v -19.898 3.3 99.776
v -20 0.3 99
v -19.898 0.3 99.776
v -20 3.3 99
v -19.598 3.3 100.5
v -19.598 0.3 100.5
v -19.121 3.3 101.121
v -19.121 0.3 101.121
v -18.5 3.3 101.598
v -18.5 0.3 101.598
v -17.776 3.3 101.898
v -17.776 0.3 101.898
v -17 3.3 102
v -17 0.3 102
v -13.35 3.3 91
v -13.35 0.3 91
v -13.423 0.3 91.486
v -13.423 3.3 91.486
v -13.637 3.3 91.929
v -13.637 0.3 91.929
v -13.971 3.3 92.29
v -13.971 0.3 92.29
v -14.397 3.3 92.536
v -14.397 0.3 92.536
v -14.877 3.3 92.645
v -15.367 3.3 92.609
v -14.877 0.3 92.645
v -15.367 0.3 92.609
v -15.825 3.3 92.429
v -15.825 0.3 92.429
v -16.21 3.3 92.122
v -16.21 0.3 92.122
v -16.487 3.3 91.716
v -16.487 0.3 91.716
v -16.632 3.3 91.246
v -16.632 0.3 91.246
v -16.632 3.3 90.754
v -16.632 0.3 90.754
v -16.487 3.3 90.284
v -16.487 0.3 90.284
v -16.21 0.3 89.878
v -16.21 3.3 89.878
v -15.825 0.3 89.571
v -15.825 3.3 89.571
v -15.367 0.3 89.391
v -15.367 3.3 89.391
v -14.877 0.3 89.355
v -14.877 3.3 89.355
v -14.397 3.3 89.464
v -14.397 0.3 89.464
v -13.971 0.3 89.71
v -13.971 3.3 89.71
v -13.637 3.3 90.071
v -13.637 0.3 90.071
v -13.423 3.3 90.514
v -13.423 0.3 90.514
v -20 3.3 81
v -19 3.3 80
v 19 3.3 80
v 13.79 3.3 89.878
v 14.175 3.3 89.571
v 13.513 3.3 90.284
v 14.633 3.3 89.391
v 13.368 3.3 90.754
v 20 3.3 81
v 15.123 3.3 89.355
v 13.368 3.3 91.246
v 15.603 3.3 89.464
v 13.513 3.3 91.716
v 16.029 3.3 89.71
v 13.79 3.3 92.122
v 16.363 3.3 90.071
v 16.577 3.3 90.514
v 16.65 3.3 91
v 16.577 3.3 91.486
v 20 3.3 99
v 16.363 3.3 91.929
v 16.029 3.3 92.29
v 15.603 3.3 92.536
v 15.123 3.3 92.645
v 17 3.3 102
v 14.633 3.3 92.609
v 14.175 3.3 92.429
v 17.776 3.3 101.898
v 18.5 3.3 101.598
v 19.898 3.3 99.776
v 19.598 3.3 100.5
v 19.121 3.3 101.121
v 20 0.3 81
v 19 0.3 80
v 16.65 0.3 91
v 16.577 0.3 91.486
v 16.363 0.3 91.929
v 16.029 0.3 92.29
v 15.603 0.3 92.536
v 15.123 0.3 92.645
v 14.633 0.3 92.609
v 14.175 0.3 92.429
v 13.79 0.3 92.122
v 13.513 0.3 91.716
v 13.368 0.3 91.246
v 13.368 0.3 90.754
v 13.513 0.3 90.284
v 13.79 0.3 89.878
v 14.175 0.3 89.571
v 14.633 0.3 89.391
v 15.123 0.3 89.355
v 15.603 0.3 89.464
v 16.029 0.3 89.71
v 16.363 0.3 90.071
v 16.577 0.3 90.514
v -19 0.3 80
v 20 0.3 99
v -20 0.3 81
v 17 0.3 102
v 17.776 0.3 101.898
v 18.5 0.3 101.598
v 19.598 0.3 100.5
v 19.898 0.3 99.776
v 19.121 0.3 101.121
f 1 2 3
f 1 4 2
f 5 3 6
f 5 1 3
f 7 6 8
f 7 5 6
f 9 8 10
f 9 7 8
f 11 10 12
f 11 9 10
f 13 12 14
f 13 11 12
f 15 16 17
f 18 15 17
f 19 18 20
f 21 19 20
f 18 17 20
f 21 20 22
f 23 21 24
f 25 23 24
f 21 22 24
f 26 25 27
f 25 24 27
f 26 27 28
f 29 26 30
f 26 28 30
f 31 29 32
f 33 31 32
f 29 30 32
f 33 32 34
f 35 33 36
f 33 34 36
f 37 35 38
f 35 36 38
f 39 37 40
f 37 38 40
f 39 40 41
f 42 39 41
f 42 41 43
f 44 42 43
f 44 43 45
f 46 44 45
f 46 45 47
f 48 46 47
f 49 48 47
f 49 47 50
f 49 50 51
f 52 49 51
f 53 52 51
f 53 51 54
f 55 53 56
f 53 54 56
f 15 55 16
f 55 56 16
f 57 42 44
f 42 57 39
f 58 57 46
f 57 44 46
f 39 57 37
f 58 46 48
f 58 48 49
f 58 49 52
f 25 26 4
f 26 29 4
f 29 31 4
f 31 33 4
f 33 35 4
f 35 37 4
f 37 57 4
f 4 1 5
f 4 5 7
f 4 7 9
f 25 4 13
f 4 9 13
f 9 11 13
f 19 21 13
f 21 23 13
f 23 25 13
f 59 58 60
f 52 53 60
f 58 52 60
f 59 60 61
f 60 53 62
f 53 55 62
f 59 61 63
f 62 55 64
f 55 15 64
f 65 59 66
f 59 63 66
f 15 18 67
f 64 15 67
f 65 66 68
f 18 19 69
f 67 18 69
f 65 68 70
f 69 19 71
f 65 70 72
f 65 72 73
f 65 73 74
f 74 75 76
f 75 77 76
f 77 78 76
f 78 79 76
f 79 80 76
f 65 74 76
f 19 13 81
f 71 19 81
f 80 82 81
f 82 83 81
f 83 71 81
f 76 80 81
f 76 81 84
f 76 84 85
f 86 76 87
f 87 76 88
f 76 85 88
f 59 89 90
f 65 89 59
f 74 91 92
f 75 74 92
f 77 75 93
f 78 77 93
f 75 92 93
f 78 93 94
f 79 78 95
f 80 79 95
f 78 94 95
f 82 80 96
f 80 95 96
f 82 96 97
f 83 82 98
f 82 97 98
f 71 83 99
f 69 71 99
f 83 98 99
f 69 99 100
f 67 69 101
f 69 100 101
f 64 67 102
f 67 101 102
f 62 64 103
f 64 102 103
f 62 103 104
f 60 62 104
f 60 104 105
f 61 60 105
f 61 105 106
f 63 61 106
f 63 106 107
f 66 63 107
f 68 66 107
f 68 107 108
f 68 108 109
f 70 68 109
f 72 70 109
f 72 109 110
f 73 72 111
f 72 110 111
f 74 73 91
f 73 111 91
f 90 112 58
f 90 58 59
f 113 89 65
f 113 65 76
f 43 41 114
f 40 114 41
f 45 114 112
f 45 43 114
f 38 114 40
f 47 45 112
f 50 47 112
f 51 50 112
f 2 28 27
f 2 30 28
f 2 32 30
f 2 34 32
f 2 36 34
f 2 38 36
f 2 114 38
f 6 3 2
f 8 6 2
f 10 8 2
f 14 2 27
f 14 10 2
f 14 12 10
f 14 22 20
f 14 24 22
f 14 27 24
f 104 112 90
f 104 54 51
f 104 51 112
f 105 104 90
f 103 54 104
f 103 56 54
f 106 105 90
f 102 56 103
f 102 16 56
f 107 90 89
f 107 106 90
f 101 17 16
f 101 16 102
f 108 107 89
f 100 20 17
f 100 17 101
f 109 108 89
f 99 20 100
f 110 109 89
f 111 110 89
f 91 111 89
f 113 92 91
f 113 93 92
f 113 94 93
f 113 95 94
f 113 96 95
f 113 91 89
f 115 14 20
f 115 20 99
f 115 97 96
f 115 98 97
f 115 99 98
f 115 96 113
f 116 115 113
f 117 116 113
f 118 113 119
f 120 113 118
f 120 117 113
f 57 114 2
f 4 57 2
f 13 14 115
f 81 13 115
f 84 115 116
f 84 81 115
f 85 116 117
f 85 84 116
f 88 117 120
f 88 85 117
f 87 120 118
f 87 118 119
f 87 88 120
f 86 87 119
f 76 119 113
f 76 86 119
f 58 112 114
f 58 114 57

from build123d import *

# Parameters (mm, degrees)
SKETCH048_W     = 40
SKETCH048_H     = 22
SKETCH048_R     = 1.65
PAD017_DEPTH    = 3
FILLET018_R     = 3
CHAMFER030_SIZE = 1


with BuildPart() as part:
    # Sketch048 → Pad017 (new body)
    with BuildSketch(Plane.XZ):
        with Locations((0, -11)):
            Rectangle(SKETCH048_W, SKETCH048_H)
        with Locations((15, -11)):
            Circle(SKETCH048_R, mode=Mode.SUBTRACT)
        with Locations((-15, -11)):
            Circle(SKETCH048_R, mode=Mode.SUBTRACT)
    extrude(amount=-PAD017_DEPTH)

    # Fillet018
    fillet018_edges = [part.edges().sort_by_distance(p)[0] for p in [
        (20, 1.5, 0),
        (-20, 1.5, 0),
    ]]
    fillet(fillet018_edges, radius=FILLET018_R)

    # Chamfer030
    chamfer030_edges = [part.edges().sort_by_distance(p)[0] for p in [
        (20, 1.5, -22),
        (-20, 1.5, -22),
    ]]
    chamfer(chamfer030_edges, length=CHAMFER030_SIZE)


with BuildPart() as part_1:
    # Body016 placement: moved
    add(part.part.moved(Location((0, 0.3, 102))))


solid = part_1.part
